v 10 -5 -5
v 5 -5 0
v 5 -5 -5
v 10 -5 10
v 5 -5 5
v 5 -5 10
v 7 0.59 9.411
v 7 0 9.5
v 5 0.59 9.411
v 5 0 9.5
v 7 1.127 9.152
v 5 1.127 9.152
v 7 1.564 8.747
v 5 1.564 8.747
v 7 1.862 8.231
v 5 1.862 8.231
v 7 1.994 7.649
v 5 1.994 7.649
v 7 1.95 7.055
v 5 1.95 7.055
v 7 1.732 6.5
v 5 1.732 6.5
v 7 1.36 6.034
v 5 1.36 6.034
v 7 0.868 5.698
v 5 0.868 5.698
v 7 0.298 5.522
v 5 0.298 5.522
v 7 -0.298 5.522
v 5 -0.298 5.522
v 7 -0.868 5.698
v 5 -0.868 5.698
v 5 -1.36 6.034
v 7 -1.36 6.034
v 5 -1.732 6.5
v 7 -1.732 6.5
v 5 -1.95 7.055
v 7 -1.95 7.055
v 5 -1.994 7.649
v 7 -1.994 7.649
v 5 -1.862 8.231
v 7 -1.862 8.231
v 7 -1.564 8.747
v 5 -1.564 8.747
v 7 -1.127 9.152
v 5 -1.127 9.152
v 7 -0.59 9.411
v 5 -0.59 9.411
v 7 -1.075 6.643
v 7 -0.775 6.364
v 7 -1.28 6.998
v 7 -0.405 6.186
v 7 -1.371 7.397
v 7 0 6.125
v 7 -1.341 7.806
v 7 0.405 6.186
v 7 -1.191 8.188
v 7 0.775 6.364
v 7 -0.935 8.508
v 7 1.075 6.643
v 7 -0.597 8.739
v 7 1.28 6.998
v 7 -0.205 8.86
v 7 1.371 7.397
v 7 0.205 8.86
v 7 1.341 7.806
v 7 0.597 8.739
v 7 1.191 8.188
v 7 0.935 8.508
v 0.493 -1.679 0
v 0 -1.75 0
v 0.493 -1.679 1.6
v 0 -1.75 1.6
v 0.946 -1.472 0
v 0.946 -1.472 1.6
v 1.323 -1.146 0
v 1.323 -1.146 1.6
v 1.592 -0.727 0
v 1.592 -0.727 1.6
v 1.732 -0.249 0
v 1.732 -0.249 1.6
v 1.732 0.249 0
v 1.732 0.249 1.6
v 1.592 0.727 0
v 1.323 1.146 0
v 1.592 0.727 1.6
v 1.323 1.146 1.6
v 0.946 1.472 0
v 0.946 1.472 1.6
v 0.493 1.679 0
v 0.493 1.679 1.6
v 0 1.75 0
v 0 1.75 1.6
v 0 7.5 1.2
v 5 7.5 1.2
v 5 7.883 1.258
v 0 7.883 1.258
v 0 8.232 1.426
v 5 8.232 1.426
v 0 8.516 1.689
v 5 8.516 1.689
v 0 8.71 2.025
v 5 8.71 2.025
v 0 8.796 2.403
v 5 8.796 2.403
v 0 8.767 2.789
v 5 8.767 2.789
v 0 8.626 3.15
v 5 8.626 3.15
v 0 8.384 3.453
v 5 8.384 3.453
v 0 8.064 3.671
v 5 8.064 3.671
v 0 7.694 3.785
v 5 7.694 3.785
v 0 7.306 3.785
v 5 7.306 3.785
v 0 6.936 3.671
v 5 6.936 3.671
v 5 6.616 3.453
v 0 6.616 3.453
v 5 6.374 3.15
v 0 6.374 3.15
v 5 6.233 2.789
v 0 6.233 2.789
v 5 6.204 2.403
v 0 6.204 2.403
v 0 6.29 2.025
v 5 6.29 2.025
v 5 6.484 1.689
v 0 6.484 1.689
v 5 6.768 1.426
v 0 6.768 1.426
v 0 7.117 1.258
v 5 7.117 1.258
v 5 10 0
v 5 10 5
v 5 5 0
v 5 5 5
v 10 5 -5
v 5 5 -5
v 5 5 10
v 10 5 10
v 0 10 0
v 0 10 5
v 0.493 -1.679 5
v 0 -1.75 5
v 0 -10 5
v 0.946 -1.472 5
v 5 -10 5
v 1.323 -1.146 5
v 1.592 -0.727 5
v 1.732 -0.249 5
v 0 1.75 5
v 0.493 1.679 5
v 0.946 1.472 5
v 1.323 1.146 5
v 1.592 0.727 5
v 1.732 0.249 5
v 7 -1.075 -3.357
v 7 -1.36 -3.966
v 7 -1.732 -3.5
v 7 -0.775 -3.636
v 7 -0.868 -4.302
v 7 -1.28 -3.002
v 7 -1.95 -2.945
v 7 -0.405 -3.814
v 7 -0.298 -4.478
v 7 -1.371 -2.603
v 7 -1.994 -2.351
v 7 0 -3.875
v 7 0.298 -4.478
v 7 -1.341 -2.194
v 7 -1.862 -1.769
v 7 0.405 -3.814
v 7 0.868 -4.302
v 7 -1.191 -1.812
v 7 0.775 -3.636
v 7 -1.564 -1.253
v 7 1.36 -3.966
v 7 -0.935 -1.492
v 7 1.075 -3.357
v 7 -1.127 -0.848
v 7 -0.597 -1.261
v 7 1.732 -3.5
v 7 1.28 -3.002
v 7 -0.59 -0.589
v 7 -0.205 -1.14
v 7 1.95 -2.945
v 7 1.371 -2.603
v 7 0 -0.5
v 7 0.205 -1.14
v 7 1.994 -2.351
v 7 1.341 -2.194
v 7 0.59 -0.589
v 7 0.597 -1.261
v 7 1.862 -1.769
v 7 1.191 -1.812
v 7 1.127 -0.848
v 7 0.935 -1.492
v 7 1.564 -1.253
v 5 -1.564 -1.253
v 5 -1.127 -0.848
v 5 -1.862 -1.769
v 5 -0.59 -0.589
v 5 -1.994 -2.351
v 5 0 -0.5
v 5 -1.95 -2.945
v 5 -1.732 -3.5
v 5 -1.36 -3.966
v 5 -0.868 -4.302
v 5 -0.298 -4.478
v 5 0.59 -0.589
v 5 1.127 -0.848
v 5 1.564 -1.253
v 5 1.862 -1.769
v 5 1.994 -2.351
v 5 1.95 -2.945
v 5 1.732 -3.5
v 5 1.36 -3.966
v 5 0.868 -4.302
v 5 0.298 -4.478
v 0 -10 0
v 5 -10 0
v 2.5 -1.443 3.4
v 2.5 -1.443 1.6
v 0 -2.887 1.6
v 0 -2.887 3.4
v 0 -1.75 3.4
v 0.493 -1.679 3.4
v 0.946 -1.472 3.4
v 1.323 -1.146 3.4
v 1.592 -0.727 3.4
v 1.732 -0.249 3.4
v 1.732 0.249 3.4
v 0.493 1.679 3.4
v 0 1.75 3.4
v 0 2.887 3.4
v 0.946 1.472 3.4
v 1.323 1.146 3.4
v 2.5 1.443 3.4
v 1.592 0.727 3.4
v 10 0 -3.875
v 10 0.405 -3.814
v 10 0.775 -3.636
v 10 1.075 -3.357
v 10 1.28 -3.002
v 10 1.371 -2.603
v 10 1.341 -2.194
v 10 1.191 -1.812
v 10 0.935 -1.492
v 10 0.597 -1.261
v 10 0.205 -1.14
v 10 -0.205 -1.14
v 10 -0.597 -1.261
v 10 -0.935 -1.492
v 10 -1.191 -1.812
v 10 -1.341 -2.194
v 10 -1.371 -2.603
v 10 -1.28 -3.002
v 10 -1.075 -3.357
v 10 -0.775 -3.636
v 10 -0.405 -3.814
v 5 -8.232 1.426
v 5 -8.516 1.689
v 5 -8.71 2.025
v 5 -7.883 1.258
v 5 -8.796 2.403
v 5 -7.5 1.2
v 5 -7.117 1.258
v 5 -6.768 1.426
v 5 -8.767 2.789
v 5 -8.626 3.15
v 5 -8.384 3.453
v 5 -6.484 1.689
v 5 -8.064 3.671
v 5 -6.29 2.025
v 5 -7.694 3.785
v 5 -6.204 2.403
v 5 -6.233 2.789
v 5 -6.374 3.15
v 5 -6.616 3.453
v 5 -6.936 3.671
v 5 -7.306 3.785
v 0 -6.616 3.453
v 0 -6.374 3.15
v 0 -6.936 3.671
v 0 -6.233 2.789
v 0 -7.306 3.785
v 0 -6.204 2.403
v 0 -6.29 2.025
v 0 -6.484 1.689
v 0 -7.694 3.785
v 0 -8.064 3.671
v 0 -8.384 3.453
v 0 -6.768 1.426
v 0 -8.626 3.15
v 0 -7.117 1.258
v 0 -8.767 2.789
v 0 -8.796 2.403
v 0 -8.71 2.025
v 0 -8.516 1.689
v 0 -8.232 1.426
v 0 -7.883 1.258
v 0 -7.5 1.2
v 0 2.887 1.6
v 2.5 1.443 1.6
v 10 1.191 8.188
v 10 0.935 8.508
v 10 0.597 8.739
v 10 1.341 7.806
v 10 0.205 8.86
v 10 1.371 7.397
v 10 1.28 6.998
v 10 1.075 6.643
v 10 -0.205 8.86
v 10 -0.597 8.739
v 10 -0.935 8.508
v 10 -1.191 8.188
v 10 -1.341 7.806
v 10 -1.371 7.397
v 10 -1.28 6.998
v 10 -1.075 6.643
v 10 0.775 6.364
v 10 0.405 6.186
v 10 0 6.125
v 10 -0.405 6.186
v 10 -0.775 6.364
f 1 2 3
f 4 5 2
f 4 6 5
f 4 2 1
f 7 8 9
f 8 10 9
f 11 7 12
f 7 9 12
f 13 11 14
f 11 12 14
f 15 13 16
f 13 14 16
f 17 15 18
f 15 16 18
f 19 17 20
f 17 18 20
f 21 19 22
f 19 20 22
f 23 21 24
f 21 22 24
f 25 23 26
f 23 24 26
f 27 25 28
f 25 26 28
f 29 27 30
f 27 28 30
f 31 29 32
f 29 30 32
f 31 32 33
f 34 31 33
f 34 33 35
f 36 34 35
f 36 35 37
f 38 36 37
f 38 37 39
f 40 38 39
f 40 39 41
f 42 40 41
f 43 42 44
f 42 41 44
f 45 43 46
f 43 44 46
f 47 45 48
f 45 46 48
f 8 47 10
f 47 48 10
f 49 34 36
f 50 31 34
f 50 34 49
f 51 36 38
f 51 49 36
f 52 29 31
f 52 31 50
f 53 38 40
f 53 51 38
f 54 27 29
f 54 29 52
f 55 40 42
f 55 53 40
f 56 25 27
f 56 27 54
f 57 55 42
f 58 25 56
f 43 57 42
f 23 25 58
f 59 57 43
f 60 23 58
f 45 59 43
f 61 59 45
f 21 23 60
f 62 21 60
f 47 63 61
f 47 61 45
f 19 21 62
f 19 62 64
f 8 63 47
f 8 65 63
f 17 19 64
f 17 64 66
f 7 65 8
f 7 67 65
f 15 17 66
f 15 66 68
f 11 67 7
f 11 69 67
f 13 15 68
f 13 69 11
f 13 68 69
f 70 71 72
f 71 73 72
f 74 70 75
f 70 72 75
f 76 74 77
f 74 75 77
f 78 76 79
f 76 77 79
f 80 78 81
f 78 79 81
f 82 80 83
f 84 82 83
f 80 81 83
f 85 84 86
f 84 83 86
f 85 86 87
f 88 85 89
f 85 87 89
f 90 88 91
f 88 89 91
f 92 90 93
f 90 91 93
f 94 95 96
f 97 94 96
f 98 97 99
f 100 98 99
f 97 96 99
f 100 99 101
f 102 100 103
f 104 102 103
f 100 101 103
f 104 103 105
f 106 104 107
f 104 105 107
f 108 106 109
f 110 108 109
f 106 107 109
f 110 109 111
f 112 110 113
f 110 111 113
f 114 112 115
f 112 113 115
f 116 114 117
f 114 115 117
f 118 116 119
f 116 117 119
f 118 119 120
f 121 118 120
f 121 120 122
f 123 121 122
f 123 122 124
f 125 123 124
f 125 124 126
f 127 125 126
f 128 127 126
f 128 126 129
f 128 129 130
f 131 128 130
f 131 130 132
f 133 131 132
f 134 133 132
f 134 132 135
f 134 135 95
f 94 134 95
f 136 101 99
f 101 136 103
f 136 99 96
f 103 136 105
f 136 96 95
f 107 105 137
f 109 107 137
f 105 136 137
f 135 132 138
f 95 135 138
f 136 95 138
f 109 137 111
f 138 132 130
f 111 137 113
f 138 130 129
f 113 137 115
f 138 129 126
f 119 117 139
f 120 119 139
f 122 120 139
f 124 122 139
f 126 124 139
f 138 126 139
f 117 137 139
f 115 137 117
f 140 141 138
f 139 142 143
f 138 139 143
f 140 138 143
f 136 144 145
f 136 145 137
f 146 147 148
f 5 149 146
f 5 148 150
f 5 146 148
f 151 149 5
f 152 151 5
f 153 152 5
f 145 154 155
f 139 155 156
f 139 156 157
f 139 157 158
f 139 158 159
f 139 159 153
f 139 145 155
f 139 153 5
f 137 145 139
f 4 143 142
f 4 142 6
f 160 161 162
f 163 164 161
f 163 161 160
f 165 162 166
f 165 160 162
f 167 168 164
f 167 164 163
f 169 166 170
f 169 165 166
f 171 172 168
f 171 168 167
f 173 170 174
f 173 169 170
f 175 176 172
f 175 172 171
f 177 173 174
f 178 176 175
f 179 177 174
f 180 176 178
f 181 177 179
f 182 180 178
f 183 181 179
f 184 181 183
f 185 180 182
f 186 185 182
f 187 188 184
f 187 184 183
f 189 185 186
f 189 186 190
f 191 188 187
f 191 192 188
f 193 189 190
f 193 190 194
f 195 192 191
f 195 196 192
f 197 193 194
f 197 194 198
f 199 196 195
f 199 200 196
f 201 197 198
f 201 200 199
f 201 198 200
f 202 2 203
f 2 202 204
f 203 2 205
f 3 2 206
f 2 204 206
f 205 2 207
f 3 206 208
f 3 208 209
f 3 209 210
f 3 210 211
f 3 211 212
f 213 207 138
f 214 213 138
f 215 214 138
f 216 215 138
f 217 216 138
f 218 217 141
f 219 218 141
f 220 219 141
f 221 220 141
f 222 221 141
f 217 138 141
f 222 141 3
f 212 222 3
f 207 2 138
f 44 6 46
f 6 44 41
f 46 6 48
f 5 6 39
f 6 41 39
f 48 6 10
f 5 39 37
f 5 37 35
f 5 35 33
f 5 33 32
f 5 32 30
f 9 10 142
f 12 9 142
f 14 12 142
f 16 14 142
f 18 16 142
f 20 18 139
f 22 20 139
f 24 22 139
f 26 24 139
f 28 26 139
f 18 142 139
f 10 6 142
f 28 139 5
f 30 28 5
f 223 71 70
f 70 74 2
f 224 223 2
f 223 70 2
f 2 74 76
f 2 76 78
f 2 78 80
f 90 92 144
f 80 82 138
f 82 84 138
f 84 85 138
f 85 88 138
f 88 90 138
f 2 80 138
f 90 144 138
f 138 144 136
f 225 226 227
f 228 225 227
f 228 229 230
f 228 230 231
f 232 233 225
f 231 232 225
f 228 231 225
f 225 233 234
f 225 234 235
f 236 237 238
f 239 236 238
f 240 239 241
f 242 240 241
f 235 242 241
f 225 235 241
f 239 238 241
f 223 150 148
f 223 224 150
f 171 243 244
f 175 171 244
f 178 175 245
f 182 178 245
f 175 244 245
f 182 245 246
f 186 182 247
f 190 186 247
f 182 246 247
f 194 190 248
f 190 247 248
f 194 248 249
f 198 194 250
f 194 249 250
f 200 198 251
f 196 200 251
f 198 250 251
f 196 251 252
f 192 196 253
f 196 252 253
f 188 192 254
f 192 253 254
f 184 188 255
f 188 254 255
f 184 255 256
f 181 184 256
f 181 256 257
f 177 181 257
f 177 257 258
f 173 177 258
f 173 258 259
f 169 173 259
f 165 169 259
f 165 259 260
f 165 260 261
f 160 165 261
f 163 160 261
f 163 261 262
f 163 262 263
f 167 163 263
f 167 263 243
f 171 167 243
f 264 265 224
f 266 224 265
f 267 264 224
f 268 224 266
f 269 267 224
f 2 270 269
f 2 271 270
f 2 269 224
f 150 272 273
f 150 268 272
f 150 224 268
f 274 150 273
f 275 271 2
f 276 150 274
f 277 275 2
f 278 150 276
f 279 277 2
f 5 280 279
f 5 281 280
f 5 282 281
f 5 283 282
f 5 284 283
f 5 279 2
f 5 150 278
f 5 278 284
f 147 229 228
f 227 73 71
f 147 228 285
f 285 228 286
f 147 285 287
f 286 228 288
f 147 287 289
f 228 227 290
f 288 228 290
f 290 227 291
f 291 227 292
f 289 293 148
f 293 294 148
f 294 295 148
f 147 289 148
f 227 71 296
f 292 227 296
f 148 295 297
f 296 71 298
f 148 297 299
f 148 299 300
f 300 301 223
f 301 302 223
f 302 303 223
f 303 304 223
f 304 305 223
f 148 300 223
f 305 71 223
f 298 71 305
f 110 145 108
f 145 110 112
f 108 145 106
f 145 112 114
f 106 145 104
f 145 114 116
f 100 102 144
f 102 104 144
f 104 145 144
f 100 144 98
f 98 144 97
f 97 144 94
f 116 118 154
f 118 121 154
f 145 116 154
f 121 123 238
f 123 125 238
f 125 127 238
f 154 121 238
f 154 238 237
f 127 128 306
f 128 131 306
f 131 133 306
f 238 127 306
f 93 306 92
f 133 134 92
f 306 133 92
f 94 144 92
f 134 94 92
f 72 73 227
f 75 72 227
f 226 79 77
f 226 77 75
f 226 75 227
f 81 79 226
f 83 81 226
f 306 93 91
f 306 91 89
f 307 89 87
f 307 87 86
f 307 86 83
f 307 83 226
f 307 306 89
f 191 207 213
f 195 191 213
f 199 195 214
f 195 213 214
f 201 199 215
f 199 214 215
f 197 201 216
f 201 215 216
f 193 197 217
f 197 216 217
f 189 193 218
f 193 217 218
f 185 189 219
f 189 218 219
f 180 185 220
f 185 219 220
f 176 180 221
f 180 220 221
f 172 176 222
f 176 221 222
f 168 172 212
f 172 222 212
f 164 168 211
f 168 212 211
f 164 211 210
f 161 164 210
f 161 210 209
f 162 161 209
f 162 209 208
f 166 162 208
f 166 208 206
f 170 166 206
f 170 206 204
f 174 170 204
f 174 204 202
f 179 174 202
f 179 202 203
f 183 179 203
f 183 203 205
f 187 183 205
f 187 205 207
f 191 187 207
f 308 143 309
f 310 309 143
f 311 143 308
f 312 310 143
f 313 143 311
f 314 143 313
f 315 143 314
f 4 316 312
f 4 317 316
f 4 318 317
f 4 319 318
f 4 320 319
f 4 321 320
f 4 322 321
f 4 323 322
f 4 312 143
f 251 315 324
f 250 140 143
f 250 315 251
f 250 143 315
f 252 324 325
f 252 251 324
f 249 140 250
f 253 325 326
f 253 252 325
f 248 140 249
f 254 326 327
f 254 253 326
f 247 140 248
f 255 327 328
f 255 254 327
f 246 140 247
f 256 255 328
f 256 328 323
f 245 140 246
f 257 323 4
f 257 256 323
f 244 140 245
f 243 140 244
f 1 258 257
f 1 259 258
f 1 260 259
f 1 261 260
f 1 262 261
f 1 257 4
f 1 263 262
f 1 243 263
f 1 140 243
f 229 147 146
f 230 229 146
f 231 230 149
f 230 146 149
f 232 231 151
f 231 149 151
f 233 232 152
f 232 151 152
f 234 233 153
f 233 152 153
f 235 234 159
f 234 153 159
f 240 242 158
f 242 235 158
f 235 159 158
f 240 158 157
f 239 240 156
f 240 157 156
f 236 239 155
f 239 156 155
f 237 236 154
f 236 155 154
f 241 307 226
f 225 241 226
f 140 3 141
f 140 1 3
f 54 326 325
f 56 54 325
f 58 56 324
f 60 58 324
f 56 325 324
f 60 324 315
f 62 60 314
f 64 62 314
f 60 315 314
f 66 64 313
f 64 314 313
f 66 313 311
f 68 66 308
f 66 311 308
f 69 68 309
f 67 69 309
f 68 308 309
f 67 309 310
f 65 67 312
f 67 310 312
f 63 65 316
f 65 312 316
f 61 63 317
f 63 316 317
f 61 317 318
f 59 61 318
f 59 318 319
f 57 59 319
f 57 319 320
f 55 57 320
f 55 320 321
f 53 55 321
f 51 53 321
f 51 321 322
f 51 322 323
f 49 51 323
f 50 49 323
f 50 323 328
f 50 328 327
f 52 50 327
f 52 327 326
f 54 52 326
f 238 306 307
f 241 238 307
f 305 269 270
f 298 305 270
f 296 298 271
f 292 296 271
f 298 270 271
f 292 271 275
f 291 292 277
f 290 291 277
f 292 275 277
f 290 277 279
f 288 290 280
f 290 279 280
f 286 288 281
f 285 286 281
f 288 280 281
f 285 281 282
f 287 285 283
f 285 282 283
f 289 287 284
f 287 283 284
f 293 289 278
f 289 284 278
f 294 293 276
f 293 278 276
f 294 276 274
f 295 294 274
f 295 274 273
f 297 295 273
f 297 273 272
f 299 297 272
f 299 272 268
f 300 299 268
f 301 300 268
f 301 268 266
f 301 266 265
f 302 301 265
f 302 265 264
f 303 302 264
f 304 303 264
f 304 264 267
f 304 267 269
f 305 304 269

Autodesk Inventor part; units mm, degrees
ref_plane "YZ Plane" through (0, 0, 0) normal (1, 0, 0) x (0, 1, 0)
ref_plane "XZ Plane" through (0, 0, 0) normal (0, 1, 0) x (-1, 0, 0)
ref_plane "XY Plane" through (0, 0, 0) normal (0, 0, 1) x (1, 0, 0)
sketch "Sketch1" plane through (0, 0, 0) normal (0, 0, 1) x (1, 0, 0)
  line L0 (10, -10) -> (-10, -10)
  line L1 (-10, -10) -> (-10, 10)
  line L2 (-10, 10) -> (10, 10)
  line L3 (10, 10) -> (10, -10)
  line L4 (10, -10) -> (-10, 10) construction
  line L5 (-10, -10) -> (10, 10) construction
  line L6 (10, -10) -> (6, -10)
  line L7 (6, 10) -> (10, 10)
  line L8 (10, 10) -> (10, -10)
  line L9 (0, 10) -> (0, -10)
  line L10 (0, -10) -> (0, 10)
  point P0 (0, 0)
  dimension "d0" = 20
  dimension "d1" = 20
extrude "Extrusion1" add sketch "Sketch1" along normal blind 5 contours L0 L9 L2 L3
ref_plane "Work Plane1" through (0, 0, 2.5) normal (0, 0, 1) x (1, 0, 0)
sketch "Sketch2" plane through (0, 0, 2.5) normal (0, 0, 1) x (1, 0, 0)
  line L0 (0, 10) -> (0, -10) projected
  line L1 (0, 2.8868) -> (2.5, 1.4434)
  line L2 (2.5, 1.4434) -> (2.5, -1.4434)
  line L3 (2.5, -1.4434) -> (0, -2.8868)
  line L4 (0, -2.8868) -> (-2.5, -1.4434)
  line L5 (-2.5, -1.4434) -> (-2.5, 1.4434)
  line L6 (-2.5, 1.4434) -> (0, 2.8868)
  point P0 (0, 0)
  point P1 (0, 0)
  dimension "d12" = 5
extrude "Extrusion2" cut sketch "Sketch2" along normal mid plane 1.8
sketch "Sketch3" plane through (0, 0, 5) normal (0, 0, 1) x (1, 0, 0)
  circle A0 centre (0, 0) radius 1.75
  dimension "d15" = 3.5
extrude "Extrusion3" cut sketch "Sketch3" against normal blind 8
sketch "Sketch4" plane through (10, -10, 0) normal (1, 0, 0) x (0, 0, -1)
  circle A0 centre (-2.5, 17.5) radius 1.3
  circle A1 centre (-2.5, 2.5) radius 1.3
  line L0 (0, 20) -> (-5, 20) projected
  line L1 (0, 0) -> (-5, 0) projected
  line L2 (0, 0) -> (0, 20) projected
  point P0 (0, 10)
  dimension "d18" = 2.5
  dimension "d19" = 2.5
  dimension "d20" = 2.5
  dimension "d21" = 2.5
  dimension "d22" = 2.6
  dimension "d23" = 2.6
extrude "Extrusion4" cut sketch "Sketch4" against normal blind 25
sketch "Sketch5" plane through (10, -10, 0) normal (1, 0, 0) x (0, 0, -1)
  circle A0 centre (-2.5, 17.5) radius 1.3 projected
  circle A1 centre (-2.5, 17.5) radius 2
  circle A2 centre (-2.5, 2.5) radius 1.3 projected
  circle A3 centre (-2.5, 2.5) radius 2
  point P0 (0, 10)
  dimension "d26" = 4
  dimension "d27" = 4
extrude "Extrusion5" cut sketch "Sketch5" against normal blind 4 contours A0 | A1 | A2 | A3
sketch "Sketch6" plane through (0, 0, 5) normal (0, 0, 1) x (1, 0, 0)
  point P0 (0, 0)
sketch "Sketch7" plane through (0, 0, 5) normal (0, 0, 1) x (1, 0, 0)
  line L0 (10, -10) -> (10, 10) projected
  line L1 (10, 10) -> (5, 10)
  line L2 (5, 10) -> (5, 5)
  line L3 (5, 5) -> (10, 5)
  line L4 (10, 5) -> (10, 10)
  line L5 (0, -10) -> (10, -10) projected
  line L6 (10, -10) -> (5, -10)
  line L7 (5, -10) -> (5, -5)
  line L8 (5, -5) -> (10, -5)
  line L9 (10, -5) -> (10, -10)
  point P0 (0, 0)
  dimension "d30" = 5
  dimension "d31" = 5
  dimension "d32" = 5
  dimension "d33" = 5
extrude "Extrusion6" cut sketch "Sketch7" against normal blind 10
sketch "Sketch8" plane through (10, -5, 0) normal (1, 0, 0) x (0, 0, -1)
  line L0 (0, 0) -> (5, 0)
  line L1 (5, 0) -> (5, 10)
  line L2 (5, 10) -> (0, 10)
  line L3 (0, 10) -> (0, 0)
  line L4 (-5, 0) -> (-5, 10) projected
  line L5 (-5, 10) -> (-10, 10)
  line L6 (-10, 10) -> (-10, 0)
  line L7 (-10, 0) -> (-5, 0)
  line L8 (-5, 0) -> (-5, 10)
  circle A0 centre (-7.5, 5) radius 1.375
  circle A1 centre (2.5, 5) radius 1.375
  point P0 (0, 5)
  point P1 (-7.5, 0)
  dimension "d36" = 5
  dimension "d37" = 5
  dimension "d38" = 5
  dimension "d39" = 2.75
  dimension "d40" = 2.75
  dimension "d41" = 5
  dimension "d42" = 5
  dimension "d43" = 5
  dimension "d44" = 5
  dimension "d45" = 2.5
  dimension "d46" = 2.5
extrude "Extrusion7" add sketch "Sketch8" against normal blind 5
sketch "Sketch9" plane through (5, -5, 0) normal (-1, 0, 0) x (0, 0, 1)
  circle A0 centre (7.5, 5) radius 1.375 projected
  circle A1 centre (7.5, 5) radius 2
  circle A2 centre (-2.5, 5) radius 1.375 projected
  circle A3 centre (-2.5, 5) radius 2
  point P0 (0, 5)
  dimension "d49" = 4
  dimension "d50" = 4
extrude "Extrusion8" cut sketch "Sketch9" against normal blind 2 contours A0 | A1 | A2 | A3
equation "\"d18\" = d19"
equation "\"d20\" = d19"
equation "\"d21\" = d19"
equation "\"d23\" = d22"
equation "\"d27\" = d26"
equation "\"d42\" = d41"
equation "\"d50\" = d49"
properties part number "POMSliderMotor"
